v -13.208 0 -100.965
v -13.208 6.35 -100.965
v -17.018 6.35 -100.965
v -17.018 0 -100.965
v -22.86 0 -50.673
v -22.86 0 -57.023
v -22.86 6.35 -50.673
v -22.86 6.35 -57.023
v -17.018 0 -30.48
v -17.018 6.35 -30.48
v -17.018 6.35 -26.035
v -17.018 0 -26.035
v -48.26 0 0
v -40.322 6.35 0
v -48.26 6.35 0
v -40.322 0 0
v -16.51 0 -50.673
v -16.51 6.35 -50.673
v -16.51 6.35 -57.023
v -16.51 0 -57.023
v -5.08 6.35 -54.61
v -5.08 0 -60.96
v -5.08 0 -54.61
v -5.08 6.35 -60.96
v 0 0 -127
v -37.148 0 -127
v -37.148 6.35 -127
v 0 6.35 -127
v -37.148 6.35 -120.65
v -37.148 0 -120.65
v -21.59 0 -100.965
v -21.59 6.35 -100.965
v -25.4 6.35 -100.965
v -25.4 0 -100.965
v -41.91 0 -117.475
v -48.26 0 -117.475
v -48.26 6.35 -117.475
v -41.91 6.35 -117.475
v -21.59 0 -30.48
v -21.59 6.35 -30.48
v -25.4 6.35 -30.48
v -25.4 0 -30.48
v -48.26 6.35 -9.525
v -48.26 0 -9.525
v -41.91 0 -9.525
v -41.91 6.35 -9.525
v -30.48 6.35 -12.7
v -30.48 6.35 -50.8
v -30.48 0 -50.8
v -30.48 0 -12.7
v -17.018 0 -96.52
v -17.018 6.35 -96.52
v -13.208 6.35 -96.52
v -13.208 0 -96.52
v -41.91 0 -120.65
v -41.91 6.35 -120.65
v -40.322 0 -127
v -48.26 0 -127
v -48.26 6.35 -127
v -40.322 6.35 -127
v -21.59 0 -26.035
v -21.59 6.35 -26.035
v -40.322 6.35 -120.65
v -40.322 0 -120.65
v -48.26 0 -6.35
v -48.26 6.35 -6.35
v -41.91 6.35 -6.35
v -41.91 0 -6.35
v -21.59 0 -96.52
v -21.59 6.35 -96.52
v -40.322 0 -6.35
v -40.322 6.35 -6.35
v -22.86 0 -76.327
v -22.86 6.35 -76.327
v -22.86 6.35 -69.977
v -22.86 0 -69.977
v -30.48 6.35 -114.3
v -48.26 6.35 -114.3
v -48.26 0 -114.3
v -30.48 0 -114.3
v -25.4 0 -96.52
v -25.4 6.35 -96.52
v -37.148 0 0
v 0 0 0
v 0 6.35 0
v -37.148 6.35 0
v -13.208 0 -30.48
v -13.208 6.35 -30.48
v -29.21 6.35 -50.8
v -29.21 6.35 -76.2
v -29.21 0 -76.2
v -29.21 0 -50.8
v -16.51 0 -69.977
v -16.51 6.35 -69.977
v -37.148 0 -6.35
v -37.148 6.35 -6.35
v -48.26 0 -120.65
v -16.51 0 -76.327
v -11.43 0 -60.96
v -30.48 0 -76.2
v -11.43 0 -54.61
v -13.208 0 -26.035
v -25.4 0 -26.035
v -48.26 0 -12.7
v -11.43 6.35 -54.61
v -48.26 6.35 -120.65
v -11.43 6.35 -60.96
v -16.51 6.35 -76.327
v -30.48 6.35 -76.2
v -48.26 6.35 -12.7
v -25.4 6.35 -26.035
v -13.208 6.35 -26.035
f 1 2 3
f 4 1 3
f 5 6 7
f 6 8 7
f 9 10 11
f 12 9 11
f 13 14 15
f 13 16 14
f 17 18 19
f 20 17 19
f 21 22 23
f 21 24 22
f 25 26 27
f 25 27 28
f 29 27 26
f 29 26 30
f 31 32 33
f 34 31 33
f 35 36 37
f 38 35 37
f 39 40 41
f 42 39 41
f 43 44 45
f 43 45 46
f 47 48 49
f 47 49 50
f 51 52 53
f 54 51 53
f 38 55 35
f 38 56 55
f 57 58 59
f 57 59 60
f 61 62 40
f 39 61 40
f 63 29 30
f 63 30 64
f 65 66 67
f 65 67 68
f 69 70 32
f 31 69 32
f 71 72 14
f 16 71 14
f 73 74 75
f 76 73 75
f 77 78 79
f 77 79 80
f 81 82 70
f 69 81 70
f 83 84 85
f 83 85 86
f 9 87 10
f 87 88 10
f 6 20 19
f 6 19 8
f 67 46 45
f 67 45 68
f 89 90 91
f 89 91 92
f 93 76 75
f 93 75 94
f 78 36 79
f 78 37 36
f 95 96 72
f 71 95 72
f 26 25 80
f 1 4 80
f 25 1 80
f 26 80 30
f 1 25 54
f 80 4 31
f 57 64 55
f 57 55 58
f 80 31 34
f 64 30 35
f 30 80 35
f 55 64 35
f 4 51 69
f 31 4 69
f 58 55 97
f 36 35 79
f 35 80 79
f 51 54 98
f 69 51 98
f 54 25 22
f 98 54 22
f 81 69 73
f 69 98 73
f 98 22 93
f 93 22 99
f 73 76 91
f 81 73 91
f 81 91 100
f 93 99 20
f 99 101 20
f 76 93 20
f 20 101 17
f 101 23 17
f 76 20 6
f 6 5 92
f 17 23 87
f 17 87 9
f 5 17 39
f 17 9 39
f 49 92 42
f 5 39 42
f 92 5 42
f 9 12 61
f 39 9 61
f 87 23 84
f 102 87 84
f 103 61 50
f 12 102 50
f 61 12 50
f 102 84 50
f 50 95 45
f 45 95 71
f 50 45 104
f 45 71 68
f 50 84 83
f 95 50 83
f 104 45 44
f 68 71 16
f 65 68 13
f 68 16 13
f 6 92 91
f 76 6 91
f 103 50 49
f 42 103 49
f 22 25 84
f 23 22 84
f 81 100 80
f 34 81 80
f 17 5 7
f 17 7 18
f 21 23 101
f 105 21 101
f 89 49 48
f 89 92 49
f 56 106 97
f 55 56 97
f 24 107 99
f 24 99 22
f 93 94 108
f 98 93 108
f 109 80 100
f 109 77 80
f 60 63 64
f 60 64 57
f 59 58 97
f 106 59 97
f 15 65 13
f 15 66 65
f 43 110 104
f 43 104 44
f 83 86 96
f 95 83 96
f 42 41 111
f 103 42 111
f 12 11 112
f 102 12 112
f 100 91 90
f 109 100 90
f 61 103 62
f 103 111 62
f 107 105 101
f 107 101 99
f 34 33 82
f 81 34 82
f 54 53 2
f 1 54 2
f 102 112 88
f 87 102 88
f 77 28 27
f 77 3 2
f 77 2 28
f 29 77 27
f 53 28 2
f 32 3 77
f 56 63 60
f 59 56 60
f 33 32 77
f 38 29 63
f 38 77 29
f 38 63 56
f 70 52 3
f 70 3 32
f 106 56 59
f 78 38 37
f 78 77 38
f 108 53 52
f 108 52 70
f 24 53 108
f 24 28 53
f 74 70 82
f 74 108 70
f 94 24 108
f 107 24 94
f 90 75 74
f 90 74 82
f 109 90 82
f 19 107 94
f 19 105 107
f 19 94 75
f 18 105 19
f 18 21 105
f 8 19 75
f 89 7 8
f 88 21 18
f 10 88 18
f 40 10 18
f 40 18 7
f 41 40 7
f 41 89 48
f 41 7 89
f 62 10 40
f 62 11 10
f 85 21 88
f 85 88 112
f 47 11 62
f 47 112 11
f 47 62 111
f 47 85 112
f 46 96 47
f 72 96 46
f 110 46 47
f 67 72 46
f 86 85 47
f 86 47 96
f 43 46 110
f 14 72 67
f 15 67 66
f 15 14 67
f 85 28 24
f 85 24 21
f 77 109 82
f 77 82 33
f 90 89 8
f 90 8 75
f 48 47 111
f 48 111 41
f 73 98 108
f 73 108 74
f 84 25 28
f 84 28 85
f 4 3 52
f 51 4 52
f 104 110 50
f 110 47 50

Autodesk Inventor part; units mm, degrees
ref_plane "YZ Plane" through (0, 0, 0) normal (1, 0, 0) x (0, 1, 0)
sketch "Sketch1" plane through (0, 0, 0) normal (0, 1, 0) x (-1, 0, 0)
  line L0 (0, 0) -> (41.91, 0)
  line L1 (41.91, 0) -> (41.91, -127)
  line L2 (41.91, -127) -> (0, -127)
  line L3 (0, -127) -> (0, 0)
  dimension "d0" = 127
  dimension "d1" = 41.91
extrude "Extrusion1" add sketch "Sketch1" along normal blind 6.35
sketch "Sketch2" plane through (0, 6.35, 0) normal (0, 1, 0) x (1, 0, 0)
  line L0 (-25.4, 26.035) -> (-21.59, 26.035)
  line L1 (-21.59, 26.035) -> (-21.59, 30.48)
  line L2 (-21.59, 30.48) -> (-25.4, 30.48)
  line L3 (-25.4, 30.48) -> (-25.4, 26.035)
  line L4 (-25.4, 96.52) -> (-21.59, 96.52)
  line L5 (-21.59, 96.52) -> (-21.59, 100.965)
  line L6 (-21.59, 100.965) -> (-25.4, 100.965)
  line L7 (-25.4, 100.965) -> (-25.4, 96.52)
  line L8 (0, 0) -> (0, 127) projected
  line L9 (-41.91, 0) -> (0, 0) projected
  line L10 (0, 127) -> (-41.91, 127) projected
  line L11 (-17.018, 26.035) -> (-13.208, 26.035)
  line L12 (-13.208, 26.035) -> (-13.208, 30.48)
  line L13 (-13.208, 30.48) -> (-17.018, 30.48)
  line L14 (-17.018, 30.48) -> (-17.018, 26.035)
  line L15 (-17.018, 96.52) -> (-13.208, 96.52)
  line L16 (-13.208, 96.52) -> (-13.208, 100.965)
  line L17 (-13.208, 100.965) -> (-17.018, 100.965)
  line L18 (-17.018, 100.965) -> (-17.018, 96.52)
  line L19 (-41.91, 127) -> (-41.91, 0) projected
  dimension "d5" = 4.445
  dimension "d6" = 3.81
  dimension "d7" = 4.445
  dimension "d8" = 26.035
  dimension "d9" = 26.035
  dimension "d12" = 4.445
  dimension "d13" = 4.445
  dimension "d14" = 3.81
  dimension "d15" = 26.035
  dimension "d16" = 26.035
  dimension "d18" = 8.382
  dimension "d36" = 16.51
extrude "Extrusion3" cut sketch "Sketch2" against normal blind 6.35 contours L3 L2 L1 L0 | L7 L6 L5 L4 | L14 L13 L12 L11 | L18 L17 L16 L15
sketch "Sketch4" plane through (0, 6.35, 0) normal (0, 1, 0) x (1, 0, 0)
  line L0 (-41.91, 127) -> (-41.91, 0) projected
  line L1 (-41.91, 114.3) -> (-29.21, 114.3)
  line L2 (-29.21, 114.3) -> (-29.21, 12.7)
  line L3 (-29.21, 12.7) -> (-41.91, 12.7)
  line L4 (-41.91, 12.7) -> (-41.91, 114.3)
  line L5 (-41.91, 0) -> (0, 0) projected
  line L6 (0, 127) -> (-41.91, 127) projected
  dimension "d61" = 12.7
  dimension "d62" = 12.7
  dimension "d63" = 12.7
sketch "Sketch6" plane through (0, 6.35, 0) normal (0, 1, 0) x (1, 0, 0)
  line L0 (0, 127) -> (-41.91, 127) projected
  line L1 (-40.3225, 127) -> (-37.1475, 127)
  line L2 (-37.1475, 127) -> (-37.1475, 120.65)
  line L3 (-37.1475, 120.65) -> (-40.3225, 120.65)
  line L4 (-40.3225, 120.65) -> (-40.3225, 127)
  line L5 (-41.91, 0) -> (0, 0) projected
  line L6 (-40.3225, 0) -> (-37.1475, 0)
  line L7 (-37.1475, 0) -> (-37.1475, 6.35)
  line L8 (-37.1475, 6.35) -> (-40.3225, 6.35)
  line L9 (-40.3225, 6.35) -> (-40.3225, 0)
  line L10 (-41.91, 127) -> (-41.91, 0) projected
  point P0 (-41.91, 107.95)
  dimension "d37" = 1.5875
  dimension "d38" = 6.35
  dimension "d39" = 3.175
  dimension "d40" = 6.35
extrude "Extrusion6" cut sketch "Sketch6" against normal blind 25.4
ref_plane "Work Plane1" through (-41.91, 0, -101.6) normal (-1, 0, 0) x (0, 0, 1)
sketch "Sketch7" plane through (-41.91, 0, -101.6) normal (-1, 0, 0) x (0, 0, 1)
  line L0 (88.9, 6.35) -> (88.9, 0) projected
  line L1 (101.6, 0) -> (101.6, 6.35) projected
  line L2 (88.9, 6.35) -> (101.6, 6.35)
  line L3 (101.6, 6.35) -> (101.6, 0)
  line L4 (101.6, 0) -> (88.9, 0)
  line L5 (88.9, 0) -> (88.9, 6.35)
  line L6 (101.6, 0) -> (-25.4, 0) projected
  line L7 (-25.4, 6.35) -> (-12.7, 6.35)
  line L8 (-12.7, 6.35) -> (-12.7, 0)
  line L9 (-12.7, 0) -> (-25.4, 0)
  line L10 (-25.4, 0) -> (-25.4, 6.35)
  point P0 (-6.35, 0)
  point P1 (-19.05, 6.35)
  dimension "d66" = 12.7
extrude "Extrusion10" add sketch "Sketch7" along normal blind 6.35
ref_plane "Work Plane2" through (-48.26, 0, -101.6) normal (-1, 0, 0) x (0, 0, 1)
extrude "Extrusion9" cut sketch "Sketch4" against normal blind 6.35
sketch "Sketch10" plane through (-48.26, 0, -101.6) normal (-1, 0, 0) x (0, 0, 1)
  line L0 (95.25, 0) -> (92.075, 0)
  line L1 (92.075, 0) -> (92.075, 6.35)
  line L2 (92.075, 6.35) -> (95.25, 6.35)
  line L3 (95.25, 6.35) -> (95.25, 0)
  line L4 (-19.05, 0) -> (-15.875, 0)
  line L5 (-15.875, 0) -> (-15.875, 6.35)
  line L6 (-15.875, 6.35) -> (-19.05, 6.35)
  line L7 (-19.05, 6.35) -> (-19.05, 0)
  line L8 (-25.4, 6.35) -> (-25.4, 0) projected
  line L9 (101.6, 0) -> (101.6, 6.35) projected
  point P0 (-12.7, 0)
  dimension "d70" = 3.175
  dimension "d72" = 3.175
  dimension "d73" = 6.35
  dimension "d74" = 6.35
  dimension "d75" = 6.35
  dimension "d76" = 6.35
extrude "Extrusion12" cut sketch "Sketch10" against normal blind 6.35
sketch "Sketch11" plane through (0, 6.35, 0) normal (0, 1, 0) x (1, 0, 0)
  line L0 (-11.43, 60.96) -> (-5.08, 60.96)
  line L1 (-5.08, 60.96) -> (-5.08, 54.61)
  line L2 (-5.08, 54.61) -> (-11.43, 54.61)
  line L3 (-11.43, 54.61) -> (-11.43, 60.96)
  line L4 (-37.1475, 0) -> (0, 0) projected
  line L5 (0, 0) -> (0, 127) projected
  line L6 (-29.21, 114.3) -> (-29.21, 12.7) projected
  dimension "d82" = 54.61
  dimension "d83" = 6.35
  dimension "d84" = 6.35
  dimension "d86" = 17.78
extrude "Extrusion13" cut sketch "Sketch11" against normal blind 6.35
sketch "Sketch12" plane through (0, 6.35, 0) normal (0, 1, 0) x (1, 0, 0)
  line L0 (-22.86, 50.673) -> (-16.51, 50.673)
  line L1 (-16.51, 50.673) -> (-16.51, 57.023)
  line L2 (-16.51, 57.023) -> (-22.86, 57.023)
  line L3 (-22.86, 57.023) -> (-22.86, 50.673)
  line L4 (-22.86, 69.977) -> (-16.51, 69.977)
  line L5 (-16.51, 69.977) -> (-16.51, 76.327)
  line L6 (-16.51, 76.327) -> (-22.86, 76.327)
  line L7 (-22.86, 76.327) -> (-22.86, 69.977)
  line L8 (-29.21, 114.3) -> (-29.21, 12.7) projected
  line L9 (-37.1475, 0) -> (0, 0) projected
  line L10 (0, 127) -> (-37.1475, 127) projected
  dimension "d90" = 6.35
  dimension "d91" = 6.35
  dimension "d92" = 6.35
  dimension "d93" = 50.673
  dimension "d94" = 6.35
  dimension "d95" = 50.673
extrude "Extrusion14" cut sketch "Sketch12" against normal blind 6.35
sketch "Sketch13" plane through (-29.21, 6.35, -114.3) normal (-1, 0, 0) x (0, 0, 1)
  line L0 (101.6, -6.35) -> (63.5, -6.35)
  line L1 (63.5, -6.35) -> (63.5, 0)
  line L2 (63.5, 0) -> (101.6, 0)
  line L3 (101.6, 0) -> (101.6, -6.35)
  line L4 (101.6, -6.35) -> (0, -6.35) projected
  line L5 (0, 0) -> (101.6, 0) projected
  line L6 (0, -6.35) -> (38.1, -6.35)
  line L7 (38.1, -6.35) -> (38.1, 0)
  line L8 (38.1, 0) -> (0, 0)
  line L9 (0, 0) -> (0, -6.35)
  point P0 (114.3, -6.35)
  dimension "d98" = 38.1
  dimension "d99" = 38.1
extrude "Extrusion15" add sketch "Sketch13" along normal blind 1.27 contours L0 L1 L2 L3 | L4 L9 L5 L7
properties part number "MonsterHolderBase"
